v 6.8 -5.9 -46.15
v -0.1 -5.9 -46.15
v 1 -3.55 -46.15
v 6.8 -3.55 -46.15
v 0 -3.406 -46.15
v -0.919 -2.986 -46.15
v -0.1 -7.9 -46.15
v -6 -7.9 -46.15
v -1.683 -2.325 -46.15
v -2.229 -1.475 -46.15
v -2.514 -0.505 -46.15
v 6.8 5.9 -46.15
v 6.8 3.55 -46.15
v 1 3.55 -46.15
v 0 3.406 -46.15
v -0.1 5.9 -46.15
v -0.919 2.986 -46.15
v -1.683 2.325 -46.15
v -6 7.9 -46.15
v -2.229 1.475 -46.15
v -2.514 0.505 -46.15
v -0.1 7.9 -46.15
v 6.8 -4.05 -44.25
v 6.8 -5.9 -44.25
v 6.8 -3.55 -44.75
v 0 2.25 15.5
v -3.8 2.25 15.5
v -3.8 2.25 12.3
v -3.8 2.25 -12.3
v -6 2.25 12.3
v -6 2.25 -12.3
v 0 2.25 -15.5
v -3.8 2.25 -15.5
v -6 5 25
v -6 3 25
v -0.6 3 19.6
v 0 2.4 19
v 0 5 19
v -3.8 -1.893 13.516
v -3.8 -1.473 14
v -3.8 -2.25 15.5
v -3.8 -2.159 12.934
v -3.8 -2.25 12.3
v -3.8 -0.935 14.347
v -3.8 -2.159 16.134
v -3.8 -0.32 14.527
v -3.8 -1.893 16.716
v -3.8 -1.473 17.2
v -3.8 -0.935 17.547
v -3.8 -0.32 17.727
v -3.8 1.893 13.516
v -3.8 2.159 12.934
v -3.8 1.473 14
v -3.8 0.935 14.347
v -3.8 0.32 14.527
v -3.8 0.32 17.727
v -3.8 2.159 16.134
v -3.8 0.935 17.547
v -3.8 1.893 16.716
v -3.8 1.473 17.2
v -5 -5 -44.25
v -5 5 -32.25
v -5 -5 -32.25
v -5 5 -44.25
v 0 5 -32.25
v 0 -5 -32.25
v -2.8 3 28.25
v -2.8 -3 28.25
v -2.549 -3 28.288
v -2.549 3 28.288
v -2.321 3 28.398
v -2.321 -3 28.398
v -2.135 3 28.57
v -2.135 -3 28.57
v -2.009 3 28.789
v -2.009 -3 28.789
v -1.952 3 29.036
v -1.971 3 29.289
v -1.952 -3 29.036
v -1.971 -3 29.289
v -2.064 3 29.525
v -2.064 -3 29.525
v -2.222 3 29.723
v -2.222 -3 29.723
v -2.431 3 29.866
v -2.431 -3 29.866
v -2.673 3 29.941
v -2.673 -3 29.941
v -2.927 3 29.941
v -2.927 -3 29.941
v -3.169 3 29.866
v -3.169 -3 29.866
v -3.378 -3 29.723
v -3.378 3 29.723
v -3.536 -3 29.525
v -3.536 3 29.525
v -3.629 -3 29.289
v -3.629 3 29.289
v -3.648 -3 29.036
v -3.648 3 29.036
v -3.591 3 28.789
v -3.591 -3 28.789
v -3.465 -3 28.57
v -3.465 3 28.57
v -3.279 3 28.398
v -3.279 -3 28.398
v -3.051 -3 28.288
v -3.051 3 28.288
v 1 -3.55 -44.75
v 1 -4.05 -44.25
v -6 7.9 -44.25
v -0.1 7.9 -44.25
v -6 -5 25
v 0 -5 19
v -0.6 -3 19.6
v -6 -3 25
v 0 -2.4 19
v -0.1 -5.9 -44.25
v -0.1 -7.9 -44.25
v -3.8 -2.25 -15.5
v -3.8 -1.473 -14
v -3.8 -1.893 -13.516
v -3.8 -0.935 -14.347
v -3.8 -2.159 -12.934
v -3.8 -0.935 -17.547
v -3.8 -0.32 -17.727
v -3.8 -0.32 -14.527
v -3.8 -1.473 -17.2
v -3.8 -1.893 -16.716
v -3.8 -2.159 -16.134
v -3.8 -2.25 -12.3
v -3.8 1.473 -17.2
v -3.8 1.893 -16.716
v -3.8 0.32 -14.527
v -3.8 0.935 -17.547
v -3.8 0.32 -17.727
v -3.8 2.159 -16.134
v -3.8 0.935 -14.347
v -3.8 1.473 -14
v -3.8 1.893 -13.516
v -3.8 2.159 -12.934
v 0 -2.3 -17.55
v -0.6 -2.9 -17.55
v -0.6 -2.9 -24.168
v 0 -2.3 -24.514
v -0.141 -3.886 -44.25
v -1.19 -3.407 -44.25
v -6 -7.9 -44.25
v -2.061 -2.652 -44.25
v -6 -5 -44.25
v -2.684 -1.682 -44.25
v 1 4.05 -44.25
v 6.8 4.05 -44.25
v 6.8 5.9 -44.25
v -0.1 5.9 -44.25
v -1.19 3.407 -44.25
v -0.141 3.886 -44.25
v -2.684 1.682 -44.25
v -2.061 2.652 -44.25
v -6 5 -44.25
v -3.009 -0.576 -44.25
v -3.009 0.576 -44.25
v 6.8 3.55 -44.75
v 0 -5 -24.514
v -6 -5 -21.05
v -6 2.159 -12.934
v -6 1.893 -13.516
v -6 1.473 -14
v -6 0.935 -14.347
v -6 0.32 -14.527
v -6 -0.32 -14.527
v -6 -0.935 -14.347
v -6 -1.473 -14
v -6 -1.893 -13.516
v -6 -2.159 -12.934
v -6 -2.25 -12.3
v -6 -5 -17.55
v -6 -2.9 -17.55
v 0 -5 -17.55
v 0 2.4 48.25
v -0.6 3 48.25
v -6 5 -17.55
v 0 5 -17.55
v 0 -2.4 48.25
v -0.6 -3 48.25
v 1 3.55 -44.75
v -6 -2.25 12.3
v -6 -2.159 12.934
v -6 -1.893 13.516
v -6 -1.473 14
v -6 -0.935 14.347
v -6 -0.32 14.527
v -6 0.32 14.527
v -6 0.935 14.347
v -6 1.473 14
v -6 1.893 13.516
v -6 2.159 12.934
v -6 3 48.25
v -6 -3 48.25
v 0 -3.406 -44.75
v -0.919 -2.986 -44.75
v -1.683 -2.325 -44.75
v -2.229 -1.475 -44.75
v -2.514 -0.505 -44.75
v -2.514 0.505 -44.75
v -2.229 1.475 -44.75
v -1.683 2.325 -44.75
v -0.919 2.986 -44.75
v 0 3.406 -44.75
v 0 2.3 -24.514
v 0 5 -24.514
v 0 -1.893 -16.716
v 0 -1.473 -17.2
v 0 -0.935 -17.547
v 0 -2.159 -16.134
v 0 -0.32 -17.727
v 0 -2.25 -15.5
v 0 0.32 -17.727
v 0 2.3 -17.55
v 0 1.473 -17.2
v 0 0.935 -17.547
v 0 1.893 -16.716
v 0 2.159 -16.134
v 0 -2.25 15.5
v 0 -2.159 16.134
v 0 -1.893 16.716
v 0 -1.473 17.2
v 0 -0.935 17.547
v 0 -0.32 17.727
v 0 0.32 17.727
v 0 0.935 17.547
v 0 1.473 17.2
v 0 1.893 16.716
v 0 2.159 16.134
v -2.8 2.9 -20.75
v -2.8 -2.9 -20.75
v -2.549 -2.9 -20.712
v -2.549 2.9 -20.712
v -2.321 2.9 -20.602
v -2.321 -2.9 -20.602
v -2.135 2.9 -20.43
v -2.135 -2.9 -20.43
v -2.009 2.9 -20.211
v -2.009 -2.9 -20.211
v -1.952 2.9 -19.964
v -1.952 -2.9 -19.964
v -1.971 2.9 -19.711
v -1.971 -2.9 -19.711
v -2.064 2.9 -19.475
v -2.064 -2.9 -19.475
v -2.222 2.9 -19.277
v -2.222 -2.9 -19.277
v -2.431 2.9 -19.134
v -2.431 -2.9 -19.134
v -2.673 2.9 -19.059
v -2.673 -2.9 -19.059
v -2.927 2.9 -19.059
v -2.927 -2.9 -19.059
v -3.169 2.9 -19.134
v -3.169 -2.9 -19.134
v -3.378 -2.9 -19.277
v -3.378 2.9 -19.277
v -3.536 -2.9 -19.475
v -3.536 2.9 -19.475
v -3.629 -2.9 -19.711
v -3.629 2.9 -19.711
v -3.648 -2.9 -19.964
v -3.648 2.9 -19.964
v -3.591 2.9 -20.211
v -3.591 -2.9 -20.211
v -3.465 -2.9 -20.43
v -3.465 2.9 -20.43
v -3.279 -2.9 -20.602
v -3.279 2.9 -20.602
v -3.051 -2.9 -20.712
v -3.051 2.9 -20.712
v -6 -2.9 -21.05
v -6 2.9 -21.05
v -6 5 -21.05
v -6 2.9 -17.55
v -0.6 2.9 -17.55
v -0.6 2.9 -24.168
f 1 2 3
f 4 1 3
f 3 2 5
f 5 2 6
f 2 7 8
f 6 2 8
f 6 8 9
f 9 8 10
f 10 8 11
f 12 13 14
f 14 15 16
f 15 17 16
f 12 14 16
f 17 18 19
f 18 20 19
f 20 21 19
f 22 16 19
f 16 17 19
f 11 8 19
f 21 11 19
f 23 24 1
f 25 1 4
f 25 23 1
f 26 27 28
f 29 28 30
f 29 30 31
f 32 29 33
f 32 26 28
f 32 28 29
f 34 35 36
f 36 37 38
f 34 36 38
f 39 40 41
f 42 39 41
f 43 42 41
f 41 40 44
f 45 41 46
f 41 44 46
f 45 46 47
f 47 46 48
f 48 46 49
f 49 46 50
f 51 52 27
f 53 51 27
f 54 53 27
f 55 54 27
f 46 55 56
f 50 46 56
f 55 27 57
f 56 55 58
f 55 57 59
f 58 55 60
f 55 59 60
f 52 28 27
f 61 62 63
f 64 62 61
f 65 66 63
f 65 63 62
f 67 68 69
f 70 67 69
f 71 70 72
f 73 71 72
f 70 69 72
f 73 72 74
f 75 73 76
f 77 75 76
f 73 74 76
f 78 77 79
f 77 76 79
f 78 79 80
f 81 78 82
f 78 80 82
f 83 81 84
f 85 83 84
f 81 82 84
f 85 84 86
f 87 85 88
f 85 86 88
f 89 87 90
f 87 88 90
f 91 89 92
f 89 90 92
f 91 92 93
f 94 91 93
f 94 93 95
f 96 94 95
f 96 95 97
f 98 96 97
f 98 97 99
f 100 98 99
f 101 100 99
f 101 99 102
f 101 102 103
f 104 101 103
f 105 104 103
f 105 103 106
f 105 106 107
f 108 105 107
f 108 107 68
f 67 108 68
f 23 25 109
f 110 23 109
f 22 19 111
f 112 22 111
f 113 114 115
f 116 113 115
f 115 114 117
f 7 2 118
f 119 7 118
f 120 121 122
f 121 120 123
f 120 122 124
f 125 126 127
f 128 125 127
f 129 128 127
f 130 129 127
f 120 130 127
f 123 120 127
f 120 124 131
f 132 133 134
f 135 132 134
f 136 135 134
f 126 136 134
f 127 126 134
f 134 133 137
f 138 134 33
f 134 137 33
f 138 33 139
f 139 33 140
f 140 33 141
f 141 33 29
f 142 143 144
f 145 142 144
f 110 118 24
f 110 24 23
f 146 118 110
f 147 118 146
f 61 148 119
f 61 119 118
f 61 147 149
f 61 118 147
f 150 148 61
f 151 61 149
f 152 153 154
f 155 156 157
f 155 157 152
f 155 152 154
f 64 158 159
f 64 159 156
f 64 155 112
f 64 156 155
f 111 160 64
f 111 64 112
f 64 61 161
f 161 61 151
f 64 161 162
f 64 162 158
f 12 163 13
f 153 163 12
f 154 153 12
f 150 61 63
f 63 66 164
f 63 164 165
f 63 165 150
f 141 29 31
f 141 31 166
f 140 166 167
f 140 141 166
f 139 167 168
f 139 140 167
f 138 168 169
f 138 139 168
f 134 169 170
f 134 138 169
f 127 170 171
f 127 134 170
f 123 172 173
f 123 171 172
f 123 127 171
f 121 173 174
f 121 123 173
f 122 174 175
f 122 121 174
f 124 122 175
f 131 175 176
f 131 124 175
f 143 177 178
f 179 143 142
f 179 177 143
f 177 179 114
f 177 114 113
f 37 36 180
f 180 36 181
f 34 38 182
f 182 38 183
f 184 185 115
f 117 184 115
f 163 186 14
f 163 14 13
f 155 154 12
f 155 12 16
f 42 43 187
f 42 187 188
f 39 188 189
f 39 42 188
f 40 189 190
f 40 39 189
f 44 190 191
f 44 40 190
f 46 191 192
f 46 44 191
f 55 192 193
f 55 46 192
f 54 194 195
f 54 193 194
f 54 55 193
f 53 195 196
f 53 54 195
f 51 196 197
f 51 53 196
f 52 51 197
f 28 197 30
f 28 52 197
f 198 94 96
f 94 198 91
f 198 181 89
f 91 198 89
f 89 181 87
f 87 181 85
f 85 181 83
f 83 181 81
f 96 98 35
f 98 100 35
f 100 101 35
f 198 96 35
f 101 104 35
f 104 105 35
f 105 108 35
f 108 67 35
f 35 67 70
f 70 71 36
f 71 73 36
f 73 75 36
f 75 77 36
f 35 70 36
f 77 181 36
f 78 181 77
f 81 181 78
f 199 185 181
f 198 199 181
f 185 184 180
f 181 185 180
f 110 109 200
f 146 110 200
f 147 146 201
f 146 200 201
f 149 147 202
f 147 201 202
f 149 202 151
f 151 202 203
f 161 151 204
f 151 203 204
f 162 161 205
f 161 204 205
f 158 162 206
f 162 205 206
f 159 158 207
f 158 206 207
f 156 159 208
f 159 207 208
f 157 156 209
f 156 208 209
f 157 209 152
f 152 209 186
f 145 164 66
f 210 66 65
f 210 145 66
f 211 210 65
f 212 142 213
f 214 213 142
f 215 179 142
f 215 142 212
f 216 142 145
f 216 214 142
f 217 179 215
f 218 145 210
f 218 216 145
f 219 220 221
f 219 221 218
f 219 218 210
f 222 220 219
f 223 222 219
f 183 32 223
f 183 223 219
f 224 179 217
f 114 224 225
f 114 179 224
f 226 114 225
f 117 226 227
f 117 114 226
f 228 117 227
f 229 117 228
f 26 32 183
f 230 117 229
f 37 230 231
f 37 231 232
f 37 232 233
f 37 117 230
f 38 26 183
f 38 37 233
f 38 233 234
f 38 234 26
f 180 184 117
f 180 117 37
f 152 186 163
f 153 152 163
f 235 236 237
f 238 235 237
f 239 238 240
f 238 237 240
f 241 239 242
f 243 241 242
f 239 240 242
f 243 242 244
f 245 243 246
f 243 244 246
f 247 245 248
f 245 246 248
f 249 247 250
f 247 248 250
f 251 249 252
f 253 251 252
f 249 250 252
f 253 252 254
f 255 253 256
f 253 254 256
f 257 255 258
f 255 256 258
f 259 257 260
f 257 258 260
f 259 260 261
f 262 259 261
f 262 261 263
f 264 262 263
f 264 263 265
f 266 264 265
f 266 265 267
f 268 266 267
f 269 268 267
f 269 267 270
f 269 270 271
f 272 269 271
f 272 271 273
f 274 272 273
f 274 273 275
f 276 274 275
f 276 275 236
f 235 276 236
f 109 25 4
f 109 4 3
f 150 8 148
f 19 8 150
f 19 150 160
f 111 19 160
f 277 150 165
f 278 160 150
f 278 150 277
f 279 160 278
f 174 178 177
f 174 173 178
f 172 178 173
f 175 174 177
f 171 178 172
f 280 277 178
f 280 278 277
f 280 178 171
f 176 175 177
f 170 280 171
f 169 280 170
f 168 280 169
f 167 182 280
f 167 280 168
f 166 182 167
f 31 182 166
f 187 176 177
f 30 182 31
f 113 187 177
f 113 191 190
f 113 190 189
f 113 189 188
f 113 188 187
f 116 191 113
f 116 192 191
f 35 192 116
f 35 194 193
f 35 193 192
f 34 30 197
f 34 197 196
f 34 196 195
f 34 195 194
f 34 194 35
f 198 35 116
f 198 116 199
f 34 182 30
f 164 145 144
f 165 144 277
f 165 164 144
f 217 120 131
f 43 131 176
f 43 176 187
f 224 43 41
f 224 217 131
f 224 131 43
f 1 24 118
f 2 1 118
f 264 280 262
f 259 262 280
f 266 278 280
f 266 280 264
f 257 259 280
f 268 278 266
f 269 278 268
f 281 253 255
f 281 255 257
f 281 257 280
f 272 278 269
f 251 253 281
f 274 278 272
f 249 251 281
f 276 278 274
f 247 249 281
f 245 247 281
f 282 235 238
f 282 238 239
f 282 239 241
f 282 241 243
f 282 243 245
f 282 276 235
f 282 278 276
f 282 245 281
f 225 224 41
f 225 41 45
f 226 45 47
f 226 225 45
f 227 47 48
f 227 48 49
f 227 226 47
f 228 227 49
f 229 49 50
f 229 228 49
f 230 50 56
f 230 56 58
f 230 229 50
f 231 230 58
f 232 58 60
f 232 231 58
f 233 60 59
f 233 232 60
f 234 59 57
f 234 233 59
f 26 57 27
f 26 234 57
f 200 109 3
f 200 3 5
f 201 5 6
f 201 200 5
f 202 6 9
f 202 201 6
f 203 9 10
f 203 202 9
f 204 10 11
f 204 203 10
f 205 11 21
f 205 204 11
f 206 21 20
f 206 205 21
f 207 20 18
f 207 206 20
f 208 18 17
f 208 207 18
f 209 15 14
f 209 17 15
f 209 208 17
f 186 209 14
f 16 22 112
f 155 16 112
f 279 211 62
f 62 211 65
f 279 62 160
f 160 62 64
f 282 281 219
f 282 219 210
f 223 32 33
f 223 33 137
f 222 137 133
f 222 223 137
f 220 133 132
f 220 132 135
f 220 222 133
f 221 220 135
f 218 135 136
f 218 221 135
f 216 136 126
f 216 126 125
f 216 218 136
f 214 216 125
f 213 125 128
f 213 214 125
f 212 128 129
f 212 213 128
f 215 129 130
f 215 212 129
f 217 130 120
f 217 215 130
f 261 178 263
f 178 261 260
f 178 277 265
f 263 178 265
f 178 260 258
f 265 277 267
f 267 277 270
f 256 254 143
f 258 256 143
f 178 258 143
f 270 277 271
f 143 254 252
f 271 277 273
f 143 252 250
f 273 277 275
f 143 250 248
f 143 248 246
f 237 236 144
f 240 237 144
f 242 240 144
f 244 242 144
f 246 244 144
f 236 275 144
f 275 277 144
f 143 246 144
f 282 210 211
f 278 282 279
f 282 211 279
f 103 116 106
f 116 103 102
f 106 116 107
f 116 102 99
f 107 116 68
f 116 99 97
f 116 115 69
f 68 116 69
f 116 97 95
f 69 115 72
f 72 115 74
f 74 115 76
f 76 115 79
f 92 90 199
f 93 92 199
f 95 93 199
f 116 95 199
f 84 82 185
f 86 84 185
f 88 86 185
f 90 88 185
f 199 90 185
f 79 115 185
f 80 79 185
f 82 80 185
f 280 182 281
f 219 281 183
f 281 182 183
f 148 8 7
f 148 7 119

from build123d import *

# Parameters (mm, degrees)
EXTRUDE_1_DEPTH     = 6
CUT_EXTRUDE_1_DEPTH = 3.8
CUT_EXTRUDE_2_DEPTH = 49.87803699
SKETCH_3_W          = 18.536502565
SKETCH_3_H          = 15.637579157
CUT_EXTRUDE_3_DEPTH = 4
SKETCH_4_W          = 6
SKETCH_4_H          = 10
EXTRUDE_2_DEPTH     = 19.25
SKETCH_5_R          = 0.85
CUT_EXTRUDE_4_DEPTH = 50.639324129
SKETCH_7_W          = 12.8
SKETCH_7_H          = 11.8
EXTRUDE_3_DEPTH     = 1.9
SKETCH_8_W          = 12
SKETCH_8_H          = 10
CUT_EXTRUDE_5_DEPTH = 5
CUT_EXTRUDE_6_DEPTH = 5
CHAMFER_1_SIZE      = 0.5
SKETCH_10_W         = 1.9
SKETCH_10_H         = 2
EXTRUDE_4_DEPTH     = 5.9
CHAMFER_2_SIZE      = 6
CUT_EXTRUDE_7_DEPTH = 2.1
CUT_EXTRUDE_START   = -10
CUT_EXTRUDE_8_DEPTH = 2.1
CHAMFER_3_SIZE      = 0.6


with BuildPart() as part:
    # 草图1 → 凸台-拉伸1 (new body)
    with BuildSketch(Plane(origin=(0, 0, 0), x_dir=(0, 0, -1), z_dir=(1, 0, 0))):
        Polygon((-25, 5), (25, 5), (25, 3), (48.25, 3), (48.25, -3), (25, -3), (25, -5), (-25, -5), (-25, -3), (-48.25, -3), (-48.25, 3), (-25, 3), align=None)
    extrude(amount=-EXTRUDE_1_DEPTH)

    # 草图1<3> → 切除-拉伸1 (cut)
    with BuildSketch(Plane(origin=(0, 0, 0), x_dir=(0, 0, -1), z_dir=(1, 0, 0))):
        with BuildLine():
            Line((-15.5, 2.25), (15.5, 2.25))
            ThreePointArc((15.5, 2.25), (17.75, 0), (15.5, -2.25))
            Line((15.5, -2.25), (-15.5, -2.25))
            ThreePointArc((-15.5, -2.25), (-17.75, 0), (-15.5, 2.25))
        make_face()
    extrude(amount=-CUT_EXTRUDE_1_DEPTH, mode=Mode.SUBTRACT)

    # 草图1<4> → 切除-拉伸2 (cut, through all)
    with BuildSketch(Plane(origin=(0, 0, 0), x_dir=(0, 0, -1), z_dir=(1, 0, 0))):
        with BuildLine():
            Line((-12.3, 2.25), (12.3, 2.25))
            ThreePointArc((12.3, 2.25), (14.55, 0), (12.3, -2.25))
            Line((12.3, -2.25), (-12.3, -2.25))
            ThreePointArc((-12.3, -2.25), (-14.55, 0), (-12.3, 2.25))
        make_face()
    extrude(amount=-CUT_EXTRUDE_2_DEPTH, mode=Mode.SUBTRACT)

    # 草图3 → 切除-拉伸3 (cut)
    with BuildSketch(Plane(origin=(0, 0, -48.25), x_dir=(-1, 0, 0), z_dir=(0, 0, -1))):
        with Locations((1.626975839, 1.766046581)):
            Rectangle(SKETCH_3_W, SKETCH_3_H)
    extrude(amount=-CUT_EXTRUDE_3_DEPTH, mode=Mode.SUBTRACT)

    # 草图4 → 凸台-拉伸2 (add)
    with BuildSketch(Plane(origin=(0, 0, -25), x_dir=(-1, 0, 0), z_dir=(0, 0, -1))):
        with Locations((3, 0)):
            Rectangle(SKETCH_4_W, SKETCH_4_H)
    extrude(amount=EXTRUDE_2_DEPTH)

    # 草图5 → 切除-拉伸4 (cut, through all)
    with BuildSketch(Plane.XZ.offset(5)):
        with Locations(Location((-2.8, 29.1, 0), (0, 0, 270))):
            Circle(SKETCH_5_R)
        with Locations(Location((-2.8, -19.9, 0), (0, 0, 270))):
            Circle(SKETCH_5_R)
    extrude(amount=-CUT_EXTRUDE_4_DEPTH, mode=Mode.SUBTRACT)

    # 草图7 → 凸台-拉伸3 (add)
    with BuildSketch(Plane(origin=(0, 0, -44.25), x_dir=(-1, 0, 0), z_dir=(0, 0, -1))):
        with Locations((-0.4, 0)):
            Rectangle(SKETCH_7_W, SKETCH_7_H)
    extrude(amount=EXTRUDE_3_DEPTH)

    # 草图8 → 切除-拉伸5 (cut)
    with BuildSketch(Plane(origin=(0, 0, 0), x_dir=(0, 0, -1), z_dir=(1, 0, 0))):
        with Locations((38.25, 0)):
            Rectangle(SKETCH_8_W, SKETCH_8_H)
    extrude(amount=-CUT_EXTRUDE_5_DEPTH, mode=Mode.SUBTRACT)

    # 草图9 → 切除-拉伸6 (cut)
    with BuildSketch(Plane.XY.offset(-44.25)):
        with BuildLine():
            Line((12.6, -3.55), (1, -3.55))
            ThreePointArc((1, -3.55), (-2.55, 0), (1, 3.55))
            Line((1, 3.55), (12.6, 3.55))
            ThreePointArc((12.6, 3.55), (16.15, 0), (12.6, -3.55))
        make_face()
    extrude(amount=-CUT_EXTRUDE_6_DEPTH, mode=Mode.SUBTRACT)

    # 倒角1
    chamfer_1_edges = [part.edges().sort_by_distance(p)[0] for p in [
        (3.9, 3.55, -44.25),
        (3.9, -3.55, -44.25),
        (-2.55, 0, -44.25),
    ]]
    chamfer(chamfer_1_edges, length=CHAMFER_1_SIZE)

    # 草图10 → 凸台-拉伸4 (add)
    with BuildSketch(Plane.ZY.offset(6)):
        with Locations((-45.2, 6.9)):
            Rectangle(SKETCH_10_W, SKETCH_10_H)
        with Locations((-45.2, -6.9)):
            Rectangle(SKETCH_10_W, SKETCH_10_H)
    extrude(amount=-EXTRUDE_4_DEPTH)

    # 倒角2
    chamfer_2_edges = [part.edges().sort_by_distance(p)[0] for p in [
        (0, 4, 25),
        (0, -4, 25),
    ]]
    chamfer(chamfer_2_edges, length=CHAMFER_2_SIZE - 0.0001)  # a hair under: the kernel refuses the full size

    # 草图11 → 切除-拉伸7 (cut)
    with BuildSketch(Plane(origin=(0, 5, 0), x_dir=(1, 0, 0), z_dir=(0, 1, 0))):
        Polygon((0, 24.514101615), (-6, 21.05), (-6, 17.55), (0, 17.55), align=None)
    extrude(amount=-CUT_EXTRUDE_7_DEPTH, mode=Mode.SUBTRACT)

    # 草图11<2> → 切除-拉伸8 (cut)
    with BuildSketch(Plane(origin=(0, 5, 0), x_dir=(1, 0, 0), z_dir=(0, 1, 0)).offset(CUT_EXTRUDE_START)):
        Polygon((0, 24.514101615), (-6, 21.05), (-6, 17.55), (0, 17.55), align=None)
    extrude(amount=CUT_EXTRUDE_8_DEPTH, mode=Mode.SUBTRACT)

    # 倒角3
    chamfer_3_edges = [part.edges().sort_by_distance(p)[0] for p in [
        (0, 3, 33.62505),
        (0, -3, 33.62505),
        (0, 2.9, -21.032050808),
        (0, -2.9, -21.032050808),
    ]]
    chamfer(chamfer_3_edges, length=CHAMFER_3_SIZE)


solid = part.part
